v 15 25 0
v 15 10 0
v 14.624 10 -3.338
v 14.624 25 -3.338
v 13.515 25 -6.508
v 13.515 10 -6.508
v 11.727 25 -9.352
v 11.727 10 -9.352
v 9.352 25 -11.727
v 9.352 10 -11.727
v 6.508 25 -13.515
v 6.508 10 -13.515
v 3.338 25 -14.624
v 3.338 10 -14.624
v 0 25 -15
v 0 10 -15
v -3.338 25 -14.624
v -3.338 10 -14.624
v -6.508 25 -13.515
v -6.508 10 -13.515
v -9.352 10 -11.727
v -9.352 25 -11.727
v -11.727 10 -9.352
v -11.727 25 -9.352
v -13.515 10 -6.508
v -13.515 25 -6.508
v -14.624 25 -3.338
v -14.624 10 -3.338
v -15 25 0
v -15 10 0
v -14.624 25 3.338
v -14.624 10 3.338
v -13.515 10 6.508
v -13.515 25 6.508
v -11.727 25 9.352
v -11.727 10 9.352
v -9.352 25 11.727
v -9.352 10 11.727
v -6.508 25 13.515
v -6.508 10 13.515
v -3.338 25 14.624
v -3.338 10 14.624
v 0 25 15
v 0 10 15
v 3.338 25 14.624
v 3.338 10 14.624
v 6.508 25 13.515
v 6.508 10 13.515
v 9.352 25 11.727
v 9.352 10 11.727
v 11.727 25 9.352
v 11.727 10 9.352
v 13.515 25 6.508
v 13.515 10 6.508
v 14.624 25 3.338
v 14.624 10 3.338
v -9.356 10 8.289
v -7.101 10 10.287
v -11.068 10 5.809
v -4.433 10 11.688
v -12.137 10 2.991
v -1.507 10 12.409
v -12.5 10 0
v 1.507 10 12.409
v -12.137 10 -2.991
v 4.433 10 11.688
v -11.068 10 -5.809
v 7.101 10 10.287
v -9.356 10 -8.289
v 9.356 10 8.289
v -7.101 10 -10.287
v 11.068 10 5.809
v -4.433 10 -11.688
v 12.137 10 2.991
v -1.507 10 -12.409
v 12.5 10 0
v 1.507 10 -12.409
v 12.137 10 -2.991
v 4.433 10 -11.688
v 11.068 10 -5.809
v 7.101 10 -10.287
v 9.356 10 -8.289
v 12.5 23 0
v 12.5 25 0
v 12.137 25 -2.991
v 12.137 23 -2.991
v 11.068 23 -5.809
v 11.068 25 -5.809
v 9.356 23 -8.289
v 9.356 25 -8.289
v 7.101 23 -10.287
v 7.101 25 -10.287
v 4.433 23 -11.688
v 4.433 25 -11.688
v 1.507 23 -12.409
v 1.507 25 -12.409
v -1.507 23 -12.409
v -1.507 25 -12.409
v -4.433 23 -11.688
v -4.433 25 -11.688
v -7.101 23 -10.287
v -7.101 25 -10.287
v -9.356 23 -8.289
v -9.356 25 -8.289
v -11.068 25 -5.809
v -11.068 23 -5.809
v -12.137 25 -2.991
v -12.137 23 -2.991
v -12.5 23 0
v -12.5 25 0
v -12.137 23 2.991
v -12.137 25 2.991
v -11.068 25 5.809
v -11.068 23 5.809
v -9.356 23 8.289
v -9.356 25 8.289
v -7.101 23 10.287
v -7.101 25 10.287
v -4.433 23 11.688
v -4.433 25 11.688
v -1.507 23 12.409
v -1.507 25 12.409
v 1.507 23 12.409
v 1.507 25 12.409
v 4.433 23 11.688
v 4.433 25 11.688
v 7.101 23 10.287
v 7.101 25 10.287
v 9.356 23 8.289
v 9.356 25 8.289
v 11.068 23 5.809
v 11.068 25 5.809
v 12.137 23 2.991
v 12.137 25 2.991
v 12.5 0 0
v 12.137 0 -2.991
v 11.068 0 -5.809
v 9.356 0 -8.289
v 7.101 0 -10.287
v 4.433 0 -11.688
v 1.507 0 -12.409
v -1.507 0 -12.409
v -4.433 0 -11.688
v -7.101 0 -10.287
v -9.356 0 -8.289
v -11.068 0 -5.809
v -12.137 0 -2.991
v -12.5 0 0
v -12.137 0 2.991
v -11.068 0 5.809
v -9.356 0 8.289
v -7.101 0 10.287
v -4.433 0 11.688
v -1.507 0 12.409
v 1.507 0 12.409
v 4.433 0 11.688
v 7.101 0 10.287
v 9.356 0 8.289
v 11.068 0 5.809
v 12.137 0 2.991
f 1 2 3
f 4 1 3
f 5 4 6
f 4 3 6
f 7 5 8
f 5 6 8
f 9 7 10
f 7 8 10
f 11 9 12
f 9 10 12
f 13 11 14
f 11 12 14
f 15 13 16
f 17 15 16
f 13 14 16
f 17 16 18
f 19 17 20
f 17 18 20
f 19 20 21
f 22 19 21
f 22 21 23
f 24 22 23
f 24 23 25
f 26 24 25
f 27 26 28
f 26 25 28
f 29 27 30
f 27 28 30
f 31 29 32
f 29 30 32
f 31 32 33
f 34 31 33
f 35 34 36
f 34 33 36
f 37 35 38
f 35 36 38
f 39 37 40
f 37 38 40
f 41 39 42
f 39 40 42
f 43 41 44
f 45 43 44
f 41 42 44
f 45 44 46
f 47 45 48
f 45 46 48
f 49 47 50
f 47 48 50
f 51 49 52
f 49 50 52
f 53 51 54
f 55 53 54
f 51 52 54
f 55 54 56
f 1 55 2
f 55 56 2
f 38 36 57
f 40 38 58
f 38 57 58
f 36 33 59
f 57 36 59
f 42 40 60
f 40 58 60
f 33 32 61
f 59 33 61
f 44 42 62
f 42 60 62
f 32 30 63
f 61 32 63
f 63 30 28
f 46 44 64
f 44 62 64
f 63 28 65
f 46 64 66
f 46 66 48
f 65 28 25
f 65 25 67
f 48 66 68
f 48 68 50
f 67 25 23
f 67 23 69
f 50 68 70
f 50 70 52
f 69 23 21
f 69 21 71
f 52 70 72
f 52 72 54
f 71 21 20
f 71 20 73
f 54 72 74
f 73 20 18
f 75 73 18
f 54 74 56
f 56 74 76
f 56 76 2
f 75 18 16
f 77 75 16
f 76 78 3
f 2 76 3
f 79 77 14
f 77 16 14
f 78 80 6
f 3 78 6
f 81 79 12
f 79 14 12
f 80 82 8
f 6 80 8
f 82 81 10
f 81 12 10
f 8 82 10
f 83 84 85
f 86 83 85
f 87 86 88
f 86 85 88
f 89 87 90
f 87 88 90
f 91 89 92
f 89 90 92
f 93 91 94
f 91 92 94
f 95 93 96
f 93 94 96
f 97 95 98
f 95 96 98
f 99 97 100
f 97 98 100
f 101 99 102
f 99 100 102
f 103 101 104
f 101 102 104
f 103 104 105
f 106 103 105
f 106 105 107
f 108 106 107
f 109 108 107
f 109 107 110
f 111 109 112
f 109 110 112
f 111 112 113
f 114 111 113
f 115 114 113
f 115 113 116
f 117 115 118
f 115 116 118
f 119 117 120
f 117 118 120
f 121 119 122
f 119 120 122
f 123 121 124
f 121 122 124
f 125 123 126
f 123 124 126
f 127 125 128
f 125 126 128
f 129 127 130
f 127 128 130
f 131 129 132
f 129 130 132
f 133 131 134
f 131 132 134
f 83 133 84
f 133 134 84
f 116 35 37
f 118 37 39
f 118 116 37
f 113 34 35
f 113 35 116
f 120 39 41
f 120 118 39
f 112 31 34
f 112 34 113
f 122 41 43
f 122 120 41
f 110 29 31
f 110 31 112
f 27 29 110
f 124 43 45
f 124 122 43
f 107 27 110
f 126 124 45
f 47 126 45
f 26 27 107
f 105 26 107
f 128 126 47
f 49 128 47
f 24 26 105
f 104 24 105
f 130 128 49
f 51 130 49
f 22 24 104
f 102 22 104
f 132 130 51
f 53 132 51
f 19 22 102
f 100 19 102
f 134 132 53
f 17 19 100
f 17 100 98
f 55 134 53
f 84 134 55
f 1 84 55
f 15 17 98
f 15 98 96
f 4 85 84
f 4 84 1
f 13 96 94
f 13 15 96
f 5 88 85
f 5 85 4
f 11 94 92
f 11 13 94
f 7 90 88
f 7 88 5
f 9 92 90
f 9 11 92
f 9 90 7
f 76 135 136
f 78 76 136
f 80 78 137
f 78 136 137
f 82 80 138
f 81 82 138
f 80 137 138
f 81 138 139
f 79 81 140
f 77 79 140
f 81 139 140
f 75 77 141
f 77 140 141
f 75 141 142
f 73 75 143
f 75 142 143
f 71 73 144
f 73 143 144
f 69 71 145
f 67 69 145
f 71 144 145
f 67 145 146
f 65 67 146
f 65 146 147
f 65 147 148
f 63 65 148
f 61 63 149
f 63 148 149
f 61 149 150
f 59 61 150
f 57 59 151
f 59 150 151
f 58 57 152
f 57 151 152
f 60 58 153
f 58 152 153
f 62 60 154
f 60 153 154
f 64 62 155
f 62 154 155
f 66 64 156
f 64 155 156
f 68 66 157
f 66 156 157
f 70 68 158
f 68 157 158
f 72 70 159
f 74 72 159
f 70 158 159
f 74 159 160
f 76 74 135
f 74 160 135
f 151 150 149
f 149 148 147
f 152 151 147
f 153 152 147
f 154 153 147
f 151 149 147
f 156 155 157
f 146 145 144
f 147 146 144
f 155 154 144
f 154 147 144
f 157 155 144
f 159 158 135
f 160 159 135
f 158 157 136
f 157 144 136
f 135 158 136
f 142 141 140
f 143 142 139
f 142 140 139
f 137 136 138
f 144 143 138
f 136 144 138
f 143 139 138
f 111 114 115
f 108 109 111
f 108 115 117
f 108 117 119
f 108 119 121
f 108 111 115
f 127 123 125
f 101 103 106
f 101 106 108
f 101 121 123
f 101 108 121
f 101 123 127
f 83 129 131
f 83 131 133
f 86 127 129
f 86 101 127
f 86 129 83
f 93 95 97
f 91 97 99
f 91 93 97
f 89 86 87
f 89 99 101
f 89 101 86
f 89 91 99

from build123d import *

# Parameters (mm, degrees)
SKETCH1_R           = 12.5
BOSS_EXTRUDE1_DEPTH = 10
SKETCH2_R           = 15
BOSS_EXTRUDE2_DEPTH = 15
SKETCH3_R           = 12.5
CUT_EXTRUDE1_DEPTH  = 2


with BuildPart() as part:
    # Sketch1 → Boss-Extrude1 (new body)
    with BuildSketch(Plane(origin=(0, 0, 0), x_dir=(1, 0, 0), z_dir=(0, 1, 0))):
        Circle(SKETCH1_R)
    extrude(amount=BOSS_EXTRUDE1_DEPTH)

    # Sketch2 → Boss-Extrude2 (add)
    with BuildSketch(Plane(origin=(0, 10, 0), x_dir=(1, 0, 0), z_dir=(0, 1, 0))):
        Circle(SKETCH2_R)
    extrude(amount=BOSS_EXTRUDE2_DEPTH)

    # Sketch3 → Cut-Extrude1 (cut)
    with BuildSketch(Plane(origin=(0, 25, 0), x_dir=(1, 0, 0), z_dir=(0, 1, 0))):
        Circle(SKETCH3_R)
    extrude(amount=-CUT_EXTRUDE1_DEPTH, mode=Mode.SUBTRACT)


solid = part.part
